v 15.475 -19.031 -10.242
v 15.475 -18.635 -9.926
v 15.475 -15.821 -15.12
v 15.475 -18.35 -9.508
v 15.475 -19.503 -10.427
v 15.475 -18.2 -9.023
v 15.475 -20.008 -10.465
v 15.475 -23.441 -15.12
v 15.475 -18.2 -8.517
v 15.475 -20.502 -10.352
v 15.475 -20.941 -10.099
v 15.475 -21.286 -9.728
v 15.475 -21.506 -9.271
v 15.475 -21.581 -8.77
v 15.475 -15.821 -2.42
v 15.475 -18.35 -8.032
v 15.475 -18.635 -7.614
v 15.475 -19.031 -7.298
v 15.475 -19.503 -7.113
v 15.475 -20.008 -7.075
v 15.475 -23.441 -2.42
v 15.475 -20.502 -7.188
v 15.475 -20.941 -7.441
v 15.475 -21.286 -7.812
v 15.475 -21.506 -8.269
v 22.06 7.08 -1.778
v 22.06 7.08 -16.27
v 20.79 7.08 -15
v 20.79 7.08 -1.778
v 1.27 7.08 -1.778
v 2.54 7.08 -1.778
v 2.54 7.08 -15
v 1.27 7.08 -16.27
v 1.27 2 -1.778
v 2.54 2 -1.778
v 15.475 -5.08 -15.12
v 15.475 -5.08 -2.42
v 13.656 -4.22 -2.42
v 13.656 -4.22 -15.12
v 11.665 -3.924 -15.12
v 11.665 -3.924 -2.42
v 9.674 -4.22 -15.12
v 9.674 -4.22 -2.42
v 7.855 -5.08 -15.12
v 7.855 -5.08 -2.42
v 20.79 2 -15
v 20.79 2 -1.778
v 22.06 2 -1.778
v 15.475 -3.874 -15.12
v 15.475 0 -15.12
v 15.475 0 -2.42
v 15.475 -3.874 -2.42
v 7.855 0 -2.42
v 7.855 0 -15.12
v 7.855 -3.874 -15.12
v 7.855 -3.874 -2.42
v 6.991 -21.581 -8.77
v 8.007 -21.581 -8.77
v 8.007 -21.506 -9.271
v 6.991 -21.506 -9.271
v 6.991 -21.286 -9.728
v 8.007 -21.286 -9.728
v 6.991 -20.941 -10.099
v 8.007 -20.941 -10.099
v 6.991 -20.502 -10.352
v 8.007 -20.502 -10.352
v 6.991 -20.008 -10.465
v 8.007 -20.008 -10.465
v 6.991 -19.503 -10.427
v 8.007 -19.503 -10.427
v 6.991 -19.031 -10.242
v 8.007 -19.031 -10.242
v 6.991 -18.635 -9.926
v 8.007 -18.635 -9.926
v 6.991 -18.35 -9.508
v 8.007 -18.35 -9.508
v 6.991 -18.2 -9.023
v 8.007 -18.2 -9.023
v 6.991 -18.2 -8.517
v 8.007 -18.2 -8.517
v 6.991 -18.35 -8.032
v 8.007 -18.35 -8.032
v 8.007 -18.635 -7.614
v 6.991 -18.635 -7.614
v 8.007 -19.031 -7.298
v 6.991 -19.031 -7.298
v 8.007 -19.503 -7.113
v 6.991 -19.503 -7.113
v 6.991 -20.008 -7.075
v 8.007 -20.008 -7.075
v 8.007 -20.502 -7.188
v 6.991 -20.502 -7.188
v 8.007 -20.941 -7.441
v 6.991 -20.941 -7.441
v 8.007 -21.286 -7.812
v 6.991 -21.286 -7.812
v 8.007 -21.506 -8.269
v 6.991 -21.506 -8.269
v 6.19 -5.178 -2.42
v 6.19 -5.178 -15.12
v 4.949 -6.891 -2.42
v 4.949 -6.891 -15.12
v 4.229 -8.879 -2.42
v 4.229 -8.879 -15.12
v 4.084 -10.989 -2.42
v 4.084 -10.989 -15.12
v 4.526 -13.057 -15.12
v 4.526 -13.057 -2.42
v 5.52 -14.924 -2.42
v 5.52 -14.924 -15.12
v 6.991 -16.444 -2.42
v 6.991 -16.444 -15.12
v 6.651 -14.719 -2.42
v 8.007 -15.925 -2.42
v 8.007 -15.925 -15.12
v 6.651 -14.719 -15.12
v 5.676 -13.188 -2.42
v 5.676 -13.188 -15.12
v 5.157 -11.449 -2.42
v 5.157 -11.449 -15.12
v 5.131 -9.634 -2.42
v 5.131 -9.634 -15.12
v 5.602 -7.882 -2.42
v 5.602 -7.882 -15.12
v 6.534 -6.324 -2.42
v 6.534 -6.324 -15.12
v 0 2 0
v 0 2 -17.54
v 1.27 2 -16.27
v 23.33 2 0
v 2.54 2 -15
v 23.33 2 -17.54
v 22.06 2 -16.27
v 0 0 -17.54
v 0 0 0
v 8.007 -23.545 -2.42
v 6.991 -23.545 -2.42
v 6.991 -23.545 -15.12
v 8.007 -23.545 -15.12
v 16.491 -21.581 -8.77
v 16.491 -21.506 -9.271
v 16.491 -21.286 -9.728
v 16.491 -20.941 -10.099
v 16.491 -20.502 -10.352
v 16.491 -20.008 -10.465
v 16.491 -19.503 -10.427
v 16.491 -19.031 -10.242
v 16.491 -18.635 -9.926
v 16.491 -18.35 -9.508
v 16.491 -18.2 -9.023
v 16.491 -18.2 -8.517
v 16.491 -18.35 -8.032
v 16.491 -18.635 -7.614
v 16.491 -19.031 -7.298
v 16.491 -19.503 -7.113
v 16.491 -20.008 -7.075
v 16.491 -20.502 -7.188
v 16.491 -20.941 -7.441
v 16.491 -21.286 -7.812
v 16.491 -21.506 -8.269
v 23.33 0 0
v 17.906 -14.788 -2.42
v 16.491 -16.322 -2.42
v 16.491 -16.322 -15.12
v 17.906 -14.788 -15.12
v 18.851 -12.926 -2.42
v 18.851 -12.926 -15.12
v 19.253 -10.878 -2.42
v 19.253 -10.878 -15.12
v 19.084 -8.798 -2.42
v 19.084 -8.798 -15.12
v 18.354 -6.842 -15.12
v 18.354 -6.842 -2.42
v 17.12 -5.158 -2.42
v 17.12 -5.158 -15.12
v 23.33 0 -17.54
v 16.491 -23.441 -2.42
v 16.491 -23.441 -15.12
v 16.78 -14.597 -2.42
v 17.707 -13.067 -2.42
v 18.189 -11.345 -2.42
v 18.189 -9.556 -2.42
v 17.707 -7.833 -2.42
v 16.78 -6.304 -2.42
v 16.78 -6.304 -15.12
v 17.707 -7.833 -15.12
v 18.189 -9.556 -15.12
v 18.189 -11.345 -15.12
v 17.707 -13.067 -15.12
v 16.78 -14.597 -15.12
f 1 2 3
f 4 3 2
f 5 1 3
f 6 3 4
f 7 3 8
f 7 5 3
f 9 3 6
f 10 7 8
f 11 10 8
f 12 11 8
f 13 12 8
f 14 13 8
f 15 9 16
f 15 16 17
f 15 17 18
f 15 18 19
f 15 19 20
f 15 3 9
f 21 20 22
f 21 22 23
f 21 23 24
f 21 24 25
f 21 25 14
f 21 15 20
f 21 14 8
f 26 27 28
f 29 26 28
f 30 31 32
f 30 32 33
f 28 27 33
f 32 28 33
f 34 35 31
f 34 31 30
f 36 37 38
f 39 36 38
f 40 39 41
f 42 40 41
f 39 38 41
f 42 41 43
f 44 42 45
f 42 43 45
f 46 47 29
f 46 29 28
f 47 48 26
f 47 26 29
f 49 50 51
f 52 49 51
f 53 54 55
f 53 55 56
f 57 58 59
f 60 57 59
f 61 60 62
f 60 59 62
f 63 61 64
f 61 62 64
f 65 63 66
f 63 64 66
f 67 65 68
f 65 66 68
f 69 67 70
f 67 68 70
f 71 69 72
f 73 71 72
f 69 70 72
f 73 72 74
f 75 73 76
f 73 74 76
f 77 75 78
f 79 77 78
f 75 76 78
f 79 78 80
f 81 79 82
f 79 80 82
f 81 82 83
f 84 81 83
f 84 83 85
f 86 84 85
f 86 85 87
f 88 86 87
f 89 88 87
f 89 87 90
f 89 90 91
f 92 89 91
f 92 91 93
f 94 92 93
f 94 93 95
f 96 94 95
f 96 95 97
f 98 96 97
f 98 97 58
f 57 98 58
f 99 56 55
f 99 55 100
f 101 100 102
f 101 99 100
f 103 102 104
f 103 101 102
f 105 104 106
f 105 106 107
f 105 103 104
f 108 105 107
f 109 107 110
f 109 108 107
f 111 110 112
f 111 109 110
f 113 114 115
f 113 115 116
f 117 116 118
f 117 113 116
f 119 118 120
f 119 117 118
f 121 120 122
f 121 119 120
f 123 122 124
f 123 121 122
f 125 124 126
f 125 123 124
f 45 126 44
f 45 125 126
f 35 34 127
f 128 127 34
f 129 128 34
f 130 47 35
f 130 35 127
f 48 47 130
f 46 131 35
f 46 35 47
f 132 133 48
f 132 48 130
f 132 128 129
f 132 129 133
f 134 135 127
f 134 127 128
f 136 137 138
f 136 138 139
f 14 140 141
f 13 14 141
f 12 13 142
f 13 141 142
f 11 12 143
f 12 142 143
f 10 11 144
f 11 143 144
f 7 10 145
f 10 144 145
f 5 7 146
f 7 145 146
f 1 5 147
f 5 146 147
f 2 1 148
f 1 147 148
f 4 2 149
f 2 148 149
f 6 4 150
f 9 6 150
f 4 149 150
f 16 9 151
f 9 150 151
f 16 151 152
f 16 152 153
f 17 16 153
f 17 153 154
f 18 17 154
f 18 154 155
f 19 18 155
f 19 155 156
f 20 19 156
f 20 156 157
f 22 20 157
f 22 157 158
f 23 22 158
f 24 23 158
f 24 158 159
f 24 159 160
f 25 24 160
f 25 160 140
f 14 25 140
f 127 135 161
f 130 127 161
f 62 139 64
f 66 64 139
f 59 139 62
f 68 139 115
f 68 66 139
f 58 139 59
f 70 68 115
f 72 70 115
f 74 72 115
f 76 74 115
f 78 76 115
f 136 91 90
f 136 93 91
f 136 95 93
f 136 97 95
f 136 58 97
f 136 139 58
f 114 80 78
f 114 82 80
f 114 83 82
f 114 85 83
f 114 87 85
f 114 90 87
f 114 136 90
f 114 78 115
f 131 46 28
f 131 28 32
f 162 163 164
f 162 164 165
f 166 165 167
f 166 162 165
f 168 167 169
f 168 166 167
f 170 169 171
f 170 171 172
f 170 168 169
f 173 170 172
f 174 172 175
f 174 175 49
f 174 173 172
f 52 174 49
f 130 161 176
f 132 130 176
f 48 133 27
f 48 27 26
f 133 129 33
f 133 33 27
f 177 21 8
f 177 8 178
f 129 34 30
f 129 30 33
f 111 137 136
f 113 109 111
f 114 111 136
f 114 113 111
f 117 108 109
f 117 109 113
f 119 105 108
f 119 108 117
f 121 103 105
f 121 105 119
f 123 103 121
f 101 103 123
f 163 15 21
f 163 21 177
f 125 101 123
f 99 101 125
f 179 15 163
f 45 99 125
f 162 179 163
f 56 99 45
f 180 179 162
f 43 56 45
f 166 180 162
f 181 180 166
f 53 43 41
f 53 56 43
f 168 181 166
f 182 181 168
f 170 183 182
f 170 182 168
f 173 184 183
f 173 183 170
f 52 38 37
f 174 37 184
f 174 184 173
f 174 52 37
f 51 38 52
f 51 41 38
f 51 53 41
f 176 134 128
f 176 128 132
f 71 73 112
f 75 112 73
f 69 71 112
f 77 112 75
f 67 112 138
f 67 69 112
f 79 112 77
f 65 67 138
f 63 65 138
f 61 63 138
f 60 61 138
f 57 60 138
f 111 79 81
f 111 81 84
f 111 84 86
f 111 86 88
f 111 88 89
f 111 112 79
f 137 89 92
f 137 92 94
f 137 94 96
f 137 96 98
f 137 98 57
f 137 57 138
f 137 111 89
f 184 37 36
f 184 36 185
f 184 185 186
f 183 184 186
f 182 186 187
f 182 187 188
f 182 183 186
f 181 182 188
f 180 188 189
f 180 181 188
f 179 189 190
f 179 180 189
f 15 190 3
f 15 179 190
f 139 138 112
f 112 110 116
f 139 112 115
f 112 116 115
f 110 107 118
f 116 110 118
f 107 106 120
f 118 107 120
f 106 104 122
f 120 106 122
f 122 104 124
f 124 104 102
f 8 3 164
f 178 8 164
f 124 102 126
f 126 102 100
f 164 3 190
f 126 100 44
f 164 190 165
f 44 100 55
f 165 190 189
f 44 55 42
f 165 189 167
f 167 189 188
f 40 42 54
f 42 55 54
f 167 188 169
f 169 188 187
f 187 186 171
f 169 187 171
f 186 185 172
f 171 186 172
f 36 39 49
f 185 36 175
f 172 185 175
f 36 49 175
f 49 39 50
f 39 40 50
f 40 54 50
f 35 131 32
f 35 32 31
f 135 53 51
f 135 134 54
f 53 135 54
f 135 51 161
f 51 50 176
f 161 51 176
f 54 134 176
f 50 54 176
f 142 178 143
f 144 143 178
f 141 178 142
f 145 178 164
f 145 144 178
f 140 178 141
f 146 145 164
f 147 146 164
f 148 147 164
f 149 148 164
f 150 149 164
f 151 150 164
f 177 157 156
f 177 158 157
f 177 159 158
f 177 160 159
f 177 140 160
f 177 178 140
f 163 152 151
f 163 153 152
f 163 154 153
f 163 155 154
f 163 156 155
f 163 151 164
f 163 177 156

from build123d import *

# Parameters (mm, degrees)
SKETCH1_W           = 23.330000076
SKETCH1_H           = 17.539999972
BOSS_EXTRUDE1_DEPTH = 2
BOSS_EXTRUDE2_DEPTH = 5.08
SKETCH3_W           = 7.62
SKETCH3_H           = 12.7
BOSS_EXTRUDE3_DEPTH = 5.08
SKETCH4_R           = 6.858
CUT_EXTRUDE2_DEPTH  = 29.688494264
BOSS_EXTRUDE4_DEPTH = 12.7
SKETCH6_R           = 1.7
CUT_EXTRUDE3_DEPTH  = 34.67462964


with BuildPart() as part:
    # Sketch1 → Boss-Extrude1 (new body)
    with BuildSketch(Plane(origin=(0, 0, 0), x_dir=(1, 0, 0), z_dir=(0, 1, 0))):
        with Locations((11.665000038, 8.769999986)):
            Rectangle(SKETCH1_W, SKETCH1_H)
    extrude(amount=BOSS_EXTRUDE1_DEPTH)

    # Sketch2 → Boss-Extrude2 (add)
    with BuildSketch(Plane(origin=(0, 2, 0), x_dir=(1, 0, 0), z_dir=(0, 1, 0))):
        Polygon((1.27, 1.778), (1.27, 16.269999972), (22.060000076, 16.269999972), (22.060000076, 1.778), (20.790000076, 1.778), (20.790000076, 14.999999972), (2.54, 14.999999972), (2.54, 1.778), align=None)
    extrude(amount=BOSS_EXTRUDE2_DEPTH)

    # Sketch3 → Boss-Extrude3 (add)
    with BuildSketch(Plane.XZ):
        with Locations((11.665000038, -8.769999986)):
            Rectangle(SKETCH3_W, SKETCH3_H)
    extrude(amount=BOSS_EXTRUDE3_DEPTH)

    # Sketch4 → Cut-Extrude2 (cut, through all)
    with BuildSketch(Plane.XY.offset(-2.419999986)):
        with Locations((11.665000038, -10.782285857)):
            Circle(SKETCH4_R)
    extrude(amount=-CUT_EXTRUDE2_DEPTH, mode=Mode.SUBTRACT)

    # Sketch5 → Boss-Extrude4 (add)
    with BuildSketch(Plane.XY.offset(-2.419999986)):
        with BuildLine():
            ThreePointArc((15.475000038, -5.08), (18.249533344, -10.450286665), (15.475000038, -15.820573329))
            Line((15.475000038, -15.820573329), (15.475000038, -17.026912436))
            Line((15.475000038, -17.026912436), (15.475000038, -23.440573329))
            Line((15.475000038, -23.440573329), (16.491000038, -23.440573329))
            Line((16.491000038, -23.440573329), (16.491000038, -16.322069234))
            ThreePointArc((16.491000038, -16.322069234), (19.240344357, -9.832010848), (15.475000038, -3.873660893))
            Line((15.475000038, -3.873660893), (15.475000038, -5.08))
        make_face()
        with BuildLine():
            ThreePointArc((8.006925979, -15.925190594), (5.081112714, -10.542517711), (7.855000038, -5.08))
            Line((7.855000038, -5.08), (7.855000038, -3.873660893))
            ThreePointArc((7.855000038, -3.873660893), (4.08236068, -9.929050728), (6.990925979, -16.443711247))
            Line((6.990925979, -16.443711247), (6.990925979, -23.545190594))
            Line((6.990925979, -23.545190594), (8.006925979, -23.545190594))
            Line((8.006925979, -23.545190594), (8.006925979, -17.112613639))
            Line((8.006925979, -17.112613639), (8.006925979, -15.925190594))
        make_face()
    extrude(amount=-BOSS_EXTRUDE4_DEPTH)

    # Sketch6 → Cut-Extrude3 (cut, through all)
    with BuildSketch(Plane(origin=(16.491000038, 0, 0), x_dir=(0, 0, -1), z_dir=(1, 0, 0))):
        with Locations(Location((8.769999986, -19.881321281, 0), (0, 0, 270))):
            Circle(SKETCH6_R)
    extrude(amount=-CUT_EXTRUDE3_DEPTH, mode=Mode.SUBTRACT)


solid = part.part
